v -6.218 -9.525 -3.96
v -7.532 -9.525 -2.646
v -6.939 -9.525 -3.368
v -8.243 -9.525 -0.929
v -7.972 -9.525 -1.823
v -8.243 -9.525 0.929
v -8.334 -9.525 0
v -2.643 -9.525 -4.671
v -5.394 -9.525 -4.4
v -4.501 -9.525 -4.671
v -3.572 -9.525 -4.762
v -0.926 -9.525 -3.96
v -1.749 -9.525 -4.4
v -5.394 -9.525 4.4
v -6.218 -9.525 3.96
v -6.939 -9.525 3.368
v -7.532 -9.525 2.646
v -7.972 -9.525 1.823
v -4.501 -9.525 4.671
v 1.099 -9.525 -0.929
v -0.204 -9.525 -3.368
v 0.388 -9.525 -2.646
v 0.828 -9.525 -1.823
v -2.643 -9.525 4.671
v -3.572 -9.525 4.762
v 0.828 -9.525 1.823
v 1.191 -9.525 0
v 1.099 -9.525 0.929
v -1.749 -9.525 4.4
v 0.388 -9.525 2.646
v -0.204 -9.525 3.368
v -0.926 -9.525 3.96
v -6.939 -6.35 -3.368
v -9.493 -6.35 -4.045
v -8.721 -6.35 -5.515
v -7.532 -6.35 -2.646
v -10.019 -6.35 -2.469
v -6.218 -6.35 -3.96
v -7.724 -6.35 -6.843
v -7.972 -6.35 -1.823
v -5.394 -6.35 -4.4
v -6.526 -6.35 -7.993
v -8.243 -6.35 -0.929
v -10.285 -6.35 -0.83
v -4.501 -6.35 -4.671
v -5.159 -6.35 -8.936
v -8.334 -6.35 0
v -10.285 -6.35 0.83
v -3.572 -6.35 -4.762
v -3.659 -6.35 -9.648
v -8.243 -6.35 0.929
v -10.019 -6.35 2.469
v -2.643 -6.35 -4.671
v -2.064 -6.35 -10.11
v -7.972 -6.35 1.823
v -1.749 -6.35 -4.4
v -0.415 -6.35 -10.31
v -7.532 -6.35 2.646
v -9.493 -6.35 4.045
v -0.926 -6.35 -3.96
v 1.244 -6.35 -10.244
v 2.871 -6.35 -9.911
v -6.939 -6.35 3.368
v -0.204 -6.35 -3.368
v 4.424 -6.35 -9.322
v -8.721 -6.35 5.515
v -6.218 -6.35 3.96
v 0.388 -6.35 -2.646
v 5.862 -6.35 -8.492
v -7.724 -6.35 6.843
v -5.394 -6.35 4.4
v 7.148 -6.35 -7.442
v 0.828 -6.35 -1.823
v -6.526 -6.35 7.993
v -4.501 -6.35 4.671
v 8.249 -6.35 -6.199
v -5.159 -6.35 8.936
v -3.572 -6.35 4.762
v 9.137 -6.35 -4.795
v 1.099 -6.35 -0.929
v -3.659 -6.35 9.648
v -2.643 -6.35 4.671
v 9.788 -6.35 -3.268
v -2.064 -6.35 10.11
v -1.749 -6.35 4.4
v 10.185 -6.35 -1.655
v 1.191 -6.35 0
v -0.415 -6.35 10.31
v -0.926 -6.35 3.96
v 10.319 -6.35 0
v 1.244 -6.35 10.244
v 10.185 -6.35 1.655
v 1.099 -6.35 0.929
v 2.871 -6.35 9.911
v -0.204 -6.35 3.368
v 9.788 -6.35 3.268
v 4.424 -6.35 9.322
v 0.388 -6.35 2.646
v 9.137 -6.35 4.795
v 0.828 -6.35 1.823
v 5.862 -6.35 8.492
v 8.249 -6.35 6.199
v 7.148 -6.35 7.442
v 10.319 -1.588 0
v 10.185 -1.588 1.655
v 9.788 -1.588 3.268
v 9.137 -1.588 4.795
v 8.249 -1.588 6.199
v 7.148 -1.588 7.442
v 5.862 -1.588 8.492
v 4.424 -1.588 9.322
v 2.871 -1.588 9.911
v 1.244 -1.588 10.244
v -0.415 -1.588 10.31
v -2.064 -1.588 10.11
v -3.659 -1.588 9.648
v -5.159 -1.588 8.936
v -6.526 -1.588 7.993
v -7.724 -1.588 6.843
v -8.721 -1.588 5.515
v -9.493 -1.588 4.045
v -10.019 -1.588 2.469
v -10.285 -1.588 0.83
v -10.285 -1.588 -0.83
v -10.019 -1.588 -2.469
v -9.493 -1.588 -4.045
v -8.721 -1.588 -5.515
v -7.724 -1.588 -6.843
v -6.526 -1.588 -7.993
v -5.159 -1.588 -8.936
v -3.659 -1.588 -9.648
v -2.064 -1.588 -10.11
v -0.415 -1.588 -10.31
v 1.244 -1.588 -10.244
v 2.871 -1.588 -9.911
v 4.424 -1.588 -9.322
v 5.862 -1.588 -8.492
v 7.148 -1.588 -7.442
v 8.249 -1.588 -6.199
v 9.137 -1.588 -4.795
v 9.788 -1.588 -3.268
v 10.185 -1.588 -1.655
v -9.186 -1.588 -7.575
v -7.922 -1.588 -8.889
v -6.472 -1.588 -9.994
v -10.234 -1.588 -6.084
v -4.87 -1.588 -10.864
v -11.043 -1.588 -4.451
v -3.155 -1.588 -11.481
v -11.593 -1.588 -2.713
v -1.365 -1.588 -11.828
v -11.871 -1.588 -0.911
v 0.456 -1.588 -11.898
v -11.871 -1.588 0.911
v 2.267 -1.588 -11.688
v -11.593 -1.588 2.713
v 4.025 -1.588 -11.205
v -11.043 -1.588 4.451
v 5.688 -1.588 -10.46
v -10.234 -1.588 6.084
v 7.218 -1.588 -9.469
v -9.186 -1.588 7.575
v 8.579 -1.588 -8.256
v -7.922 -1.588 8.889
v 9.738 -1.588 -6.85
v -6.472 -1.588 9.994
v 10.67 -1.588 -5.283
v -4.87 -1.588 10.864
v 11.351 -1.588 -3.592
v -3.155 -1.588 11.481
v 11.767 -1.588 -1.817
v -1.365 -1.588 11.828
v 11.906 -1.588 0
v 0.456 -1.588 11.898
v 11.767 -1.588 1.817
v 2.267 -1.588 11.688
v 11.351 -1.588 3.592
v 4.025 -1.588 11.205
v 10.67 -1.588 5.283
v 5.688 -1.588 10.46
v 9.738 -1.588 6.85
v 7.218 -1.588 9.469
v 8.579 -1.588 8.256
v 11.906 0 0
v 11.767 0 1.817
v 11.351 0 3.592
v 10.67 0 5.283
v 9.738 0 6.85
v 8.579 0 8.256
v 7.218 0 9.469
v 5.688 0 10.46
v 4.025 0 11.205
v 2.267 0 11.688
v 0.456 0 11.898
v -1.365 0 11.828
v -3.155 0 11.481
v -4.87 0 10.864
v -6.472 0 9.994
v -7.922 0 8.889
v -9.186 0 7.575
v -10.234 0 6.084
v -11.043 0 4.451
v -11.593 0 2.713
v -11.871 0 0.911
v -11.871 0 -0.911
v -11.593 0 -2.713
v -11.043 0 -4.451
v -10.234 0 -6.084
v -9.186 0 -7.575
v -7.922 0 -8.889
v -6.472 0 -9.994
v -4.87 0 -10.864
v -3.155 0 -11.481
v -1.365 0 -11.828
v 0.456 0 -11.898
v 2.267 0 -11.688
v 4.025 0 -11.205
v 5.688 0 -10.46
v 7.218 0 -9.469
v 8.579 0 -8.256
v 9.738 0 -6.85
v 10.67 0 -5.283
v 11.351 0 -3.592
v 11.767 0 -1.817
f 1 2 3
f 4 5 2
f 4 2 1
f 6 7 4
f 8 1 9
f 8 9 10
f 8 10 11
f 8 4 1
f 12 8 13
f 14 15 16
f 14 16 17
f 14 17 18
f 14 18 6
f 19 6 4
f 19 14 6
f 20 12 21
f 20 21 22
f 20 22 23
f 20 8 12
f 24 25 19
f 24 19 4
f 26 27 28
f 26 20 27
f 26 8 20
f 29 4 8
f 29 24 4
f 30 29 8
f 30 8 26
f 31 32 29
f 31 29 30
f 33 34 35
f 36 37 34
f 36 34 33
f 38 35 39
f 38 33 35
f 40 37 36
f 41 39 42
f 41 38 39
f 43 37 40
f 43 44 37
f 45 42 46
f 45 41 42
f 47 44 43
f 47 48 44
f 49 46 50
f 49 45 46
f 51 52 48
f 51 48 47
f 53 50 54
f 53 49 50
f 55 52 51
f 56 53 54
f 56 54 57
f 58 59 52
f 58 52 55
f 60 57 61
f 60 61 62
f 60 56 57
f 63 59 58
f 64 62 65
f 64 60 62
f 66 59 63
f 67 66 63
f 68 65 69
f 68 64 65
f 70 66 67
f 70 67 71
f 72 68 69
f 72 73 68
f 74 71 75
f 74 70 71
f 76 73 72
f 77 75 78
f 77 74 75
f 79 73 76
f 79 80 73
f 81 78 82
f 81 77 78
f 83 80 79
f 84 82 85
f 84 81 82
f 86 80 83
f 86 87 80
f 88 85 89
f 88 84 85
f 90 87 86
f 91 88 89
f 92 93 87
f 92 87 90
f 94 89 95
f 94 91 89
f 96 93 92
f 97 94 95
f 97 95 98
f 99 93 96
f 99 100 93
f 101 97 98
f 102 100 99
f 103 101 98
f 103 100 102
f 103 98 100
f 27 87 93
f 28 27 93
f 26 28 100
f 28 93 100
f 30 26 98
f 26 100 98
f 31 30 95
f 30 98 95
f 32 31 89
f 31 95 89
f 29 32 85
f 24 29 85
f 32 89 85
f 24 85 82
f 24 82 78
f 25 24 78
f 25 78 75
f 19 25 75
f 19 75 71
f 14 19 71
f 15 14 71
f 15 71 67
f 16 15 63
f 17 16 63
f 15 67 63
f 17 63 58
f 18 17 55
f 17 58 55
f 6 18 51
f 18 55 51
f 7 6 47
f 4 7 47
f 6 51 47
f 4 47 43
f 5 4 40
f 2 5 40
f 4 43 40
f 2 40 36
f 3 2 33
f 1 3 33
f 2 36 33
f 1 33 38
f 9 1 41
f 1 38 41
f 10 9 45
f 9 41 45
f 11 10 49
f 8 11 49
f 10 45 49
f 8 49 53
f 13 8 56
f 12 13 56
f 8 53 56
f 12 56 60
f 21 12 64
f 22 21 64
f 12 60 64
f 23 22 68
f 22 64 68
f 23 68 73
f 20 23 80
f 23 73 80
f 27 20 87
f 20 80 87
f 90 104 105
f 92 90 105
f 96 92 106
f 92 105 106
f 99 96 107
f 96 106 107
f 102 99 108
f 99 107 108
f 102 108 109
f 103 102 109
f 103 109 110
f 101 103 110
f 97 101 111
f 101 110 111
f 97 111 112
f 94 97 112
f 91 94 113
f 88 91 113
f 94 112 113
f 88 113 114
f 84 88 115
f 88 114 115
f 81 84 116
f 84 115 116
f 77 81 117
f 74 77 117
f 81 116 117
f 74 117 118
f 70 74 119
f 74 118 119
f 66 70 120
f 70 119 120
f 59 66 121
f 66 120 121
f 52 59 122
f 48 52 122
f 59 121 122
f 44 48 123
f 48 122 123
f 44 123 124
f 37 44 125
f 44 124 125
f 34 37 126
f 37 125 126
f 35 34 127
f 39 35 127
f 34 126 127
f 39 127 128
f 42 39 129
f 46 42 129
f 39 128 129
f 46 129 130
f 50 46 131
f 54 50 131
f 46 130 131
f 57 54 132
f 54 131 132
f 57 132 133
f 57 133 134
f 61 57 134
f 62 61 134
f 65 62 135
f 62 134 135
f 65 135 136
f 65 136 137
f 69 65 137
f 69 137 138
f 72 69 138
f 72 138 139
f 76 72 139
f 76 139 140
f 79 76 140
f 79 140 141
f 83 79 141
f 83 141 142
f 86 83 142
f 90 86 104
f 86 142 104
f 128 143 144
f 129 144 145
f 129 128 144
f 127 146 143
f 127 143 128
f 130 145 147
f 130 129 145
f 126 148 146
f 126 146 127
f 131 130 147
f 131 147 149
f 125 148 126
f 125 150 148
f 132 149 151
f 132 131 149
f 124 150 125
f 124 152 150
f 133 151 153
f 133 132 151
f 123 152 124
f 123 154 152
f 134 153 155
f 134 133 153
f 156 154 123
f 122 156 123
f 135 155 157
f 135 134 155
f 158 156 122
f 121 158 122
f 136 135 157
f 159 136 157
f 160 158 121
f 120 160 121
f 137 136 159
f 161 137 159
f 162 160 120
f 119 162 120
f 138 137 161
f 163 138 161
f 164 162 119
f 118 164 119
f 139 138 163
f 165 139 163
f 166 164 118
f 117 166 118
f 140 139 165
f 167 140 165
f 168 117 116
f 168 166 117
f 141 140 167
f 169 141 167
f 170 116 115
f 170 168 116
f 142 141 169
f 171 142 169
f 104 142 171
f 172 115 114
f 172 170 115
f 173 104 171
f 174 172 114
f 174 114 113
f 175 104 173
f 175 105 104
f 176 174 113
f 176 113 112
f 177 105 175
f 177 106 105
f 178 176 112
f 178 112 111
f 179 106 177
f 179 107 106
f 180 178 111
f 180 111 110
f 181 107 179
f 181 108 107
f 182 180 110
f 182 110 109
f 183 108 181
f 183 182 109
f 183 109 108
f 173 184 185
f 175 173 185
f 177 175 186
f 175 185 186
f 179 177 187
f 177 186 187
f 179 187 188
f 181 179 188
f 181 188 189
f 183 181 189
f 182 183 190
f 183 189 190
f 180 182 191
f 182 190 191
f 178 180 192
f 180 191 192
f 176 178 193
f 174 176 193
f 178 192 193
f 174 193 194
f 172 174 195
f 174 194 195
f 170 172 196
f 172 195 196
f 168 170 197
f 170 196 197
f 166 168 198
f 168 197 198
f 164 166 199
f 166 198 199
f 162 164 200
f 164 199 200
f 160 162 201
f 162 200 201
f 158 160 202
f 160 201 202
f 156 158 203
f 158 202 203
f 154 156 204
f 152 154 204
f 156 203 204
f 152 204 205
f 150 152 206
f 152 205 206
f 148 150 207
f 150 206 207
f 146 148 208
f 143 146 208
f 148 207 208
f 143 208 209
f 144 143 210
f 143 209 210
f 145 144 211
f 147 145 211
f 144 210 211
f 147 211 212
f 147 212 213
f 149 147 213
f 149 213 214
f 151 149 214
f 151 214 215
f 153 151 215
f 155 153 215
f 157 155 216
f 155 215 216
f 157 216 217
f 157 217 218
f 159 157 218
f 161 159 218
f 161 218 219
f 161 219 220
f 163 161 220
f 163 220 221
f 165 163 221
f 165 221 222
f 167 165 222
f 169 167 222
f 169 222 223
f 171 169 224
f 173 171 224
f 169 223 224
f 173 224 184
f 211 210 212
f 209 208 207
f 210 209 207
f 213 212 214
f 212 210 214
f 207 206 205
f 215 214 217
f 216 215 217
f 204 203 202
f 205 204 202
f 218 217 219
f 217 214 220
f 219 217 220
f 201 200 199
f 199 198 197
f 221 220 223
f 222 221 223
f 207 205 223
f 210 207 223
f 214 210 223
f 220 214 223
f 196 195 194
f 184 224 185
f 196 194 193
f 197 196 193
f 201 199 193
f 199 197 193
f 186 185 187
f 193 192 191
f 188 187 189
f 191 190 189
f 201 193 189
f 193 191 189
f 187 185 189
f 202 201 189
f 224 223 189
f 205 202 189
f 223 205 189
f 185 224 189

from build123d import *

# Parameters (mm, degrees)
F0_R     = 11.90625
F1_DEPTH = 1.5875
F2_R     = 10.31875
F3_DEPTH = 4.7625
F4_R     = 4.7625
F5_DEPTH = 3.175


# Not quite as in the source:
# - a length typed as a fraction of an inch, garbled in the dataset ("3 / 203.2 mm" for 3/8 in), is restored


with BuildPart() as f1:
    # F0 (on Front) → F1 (new body)
    with BuildSketch(Plane.XZ):
        Circle(F0_R)
    extrude(amount=F1_DEPTH)

    # F2 (on face) → F3 (join)
    with BuildSketch(Plane.XZ.offset(1.5875)):
        Circle(F2_R)
    extrude(amount=F3_DEPTH)

    # F4 (on face) → F5 (join)
    with BuildSketch(Plane.XZ.offset(6.35)):
        with Locations((-3.571875, 0)):
            Circle(F4_R)
    extrude(amount=F5_DEPTH)


solid = f1.part
